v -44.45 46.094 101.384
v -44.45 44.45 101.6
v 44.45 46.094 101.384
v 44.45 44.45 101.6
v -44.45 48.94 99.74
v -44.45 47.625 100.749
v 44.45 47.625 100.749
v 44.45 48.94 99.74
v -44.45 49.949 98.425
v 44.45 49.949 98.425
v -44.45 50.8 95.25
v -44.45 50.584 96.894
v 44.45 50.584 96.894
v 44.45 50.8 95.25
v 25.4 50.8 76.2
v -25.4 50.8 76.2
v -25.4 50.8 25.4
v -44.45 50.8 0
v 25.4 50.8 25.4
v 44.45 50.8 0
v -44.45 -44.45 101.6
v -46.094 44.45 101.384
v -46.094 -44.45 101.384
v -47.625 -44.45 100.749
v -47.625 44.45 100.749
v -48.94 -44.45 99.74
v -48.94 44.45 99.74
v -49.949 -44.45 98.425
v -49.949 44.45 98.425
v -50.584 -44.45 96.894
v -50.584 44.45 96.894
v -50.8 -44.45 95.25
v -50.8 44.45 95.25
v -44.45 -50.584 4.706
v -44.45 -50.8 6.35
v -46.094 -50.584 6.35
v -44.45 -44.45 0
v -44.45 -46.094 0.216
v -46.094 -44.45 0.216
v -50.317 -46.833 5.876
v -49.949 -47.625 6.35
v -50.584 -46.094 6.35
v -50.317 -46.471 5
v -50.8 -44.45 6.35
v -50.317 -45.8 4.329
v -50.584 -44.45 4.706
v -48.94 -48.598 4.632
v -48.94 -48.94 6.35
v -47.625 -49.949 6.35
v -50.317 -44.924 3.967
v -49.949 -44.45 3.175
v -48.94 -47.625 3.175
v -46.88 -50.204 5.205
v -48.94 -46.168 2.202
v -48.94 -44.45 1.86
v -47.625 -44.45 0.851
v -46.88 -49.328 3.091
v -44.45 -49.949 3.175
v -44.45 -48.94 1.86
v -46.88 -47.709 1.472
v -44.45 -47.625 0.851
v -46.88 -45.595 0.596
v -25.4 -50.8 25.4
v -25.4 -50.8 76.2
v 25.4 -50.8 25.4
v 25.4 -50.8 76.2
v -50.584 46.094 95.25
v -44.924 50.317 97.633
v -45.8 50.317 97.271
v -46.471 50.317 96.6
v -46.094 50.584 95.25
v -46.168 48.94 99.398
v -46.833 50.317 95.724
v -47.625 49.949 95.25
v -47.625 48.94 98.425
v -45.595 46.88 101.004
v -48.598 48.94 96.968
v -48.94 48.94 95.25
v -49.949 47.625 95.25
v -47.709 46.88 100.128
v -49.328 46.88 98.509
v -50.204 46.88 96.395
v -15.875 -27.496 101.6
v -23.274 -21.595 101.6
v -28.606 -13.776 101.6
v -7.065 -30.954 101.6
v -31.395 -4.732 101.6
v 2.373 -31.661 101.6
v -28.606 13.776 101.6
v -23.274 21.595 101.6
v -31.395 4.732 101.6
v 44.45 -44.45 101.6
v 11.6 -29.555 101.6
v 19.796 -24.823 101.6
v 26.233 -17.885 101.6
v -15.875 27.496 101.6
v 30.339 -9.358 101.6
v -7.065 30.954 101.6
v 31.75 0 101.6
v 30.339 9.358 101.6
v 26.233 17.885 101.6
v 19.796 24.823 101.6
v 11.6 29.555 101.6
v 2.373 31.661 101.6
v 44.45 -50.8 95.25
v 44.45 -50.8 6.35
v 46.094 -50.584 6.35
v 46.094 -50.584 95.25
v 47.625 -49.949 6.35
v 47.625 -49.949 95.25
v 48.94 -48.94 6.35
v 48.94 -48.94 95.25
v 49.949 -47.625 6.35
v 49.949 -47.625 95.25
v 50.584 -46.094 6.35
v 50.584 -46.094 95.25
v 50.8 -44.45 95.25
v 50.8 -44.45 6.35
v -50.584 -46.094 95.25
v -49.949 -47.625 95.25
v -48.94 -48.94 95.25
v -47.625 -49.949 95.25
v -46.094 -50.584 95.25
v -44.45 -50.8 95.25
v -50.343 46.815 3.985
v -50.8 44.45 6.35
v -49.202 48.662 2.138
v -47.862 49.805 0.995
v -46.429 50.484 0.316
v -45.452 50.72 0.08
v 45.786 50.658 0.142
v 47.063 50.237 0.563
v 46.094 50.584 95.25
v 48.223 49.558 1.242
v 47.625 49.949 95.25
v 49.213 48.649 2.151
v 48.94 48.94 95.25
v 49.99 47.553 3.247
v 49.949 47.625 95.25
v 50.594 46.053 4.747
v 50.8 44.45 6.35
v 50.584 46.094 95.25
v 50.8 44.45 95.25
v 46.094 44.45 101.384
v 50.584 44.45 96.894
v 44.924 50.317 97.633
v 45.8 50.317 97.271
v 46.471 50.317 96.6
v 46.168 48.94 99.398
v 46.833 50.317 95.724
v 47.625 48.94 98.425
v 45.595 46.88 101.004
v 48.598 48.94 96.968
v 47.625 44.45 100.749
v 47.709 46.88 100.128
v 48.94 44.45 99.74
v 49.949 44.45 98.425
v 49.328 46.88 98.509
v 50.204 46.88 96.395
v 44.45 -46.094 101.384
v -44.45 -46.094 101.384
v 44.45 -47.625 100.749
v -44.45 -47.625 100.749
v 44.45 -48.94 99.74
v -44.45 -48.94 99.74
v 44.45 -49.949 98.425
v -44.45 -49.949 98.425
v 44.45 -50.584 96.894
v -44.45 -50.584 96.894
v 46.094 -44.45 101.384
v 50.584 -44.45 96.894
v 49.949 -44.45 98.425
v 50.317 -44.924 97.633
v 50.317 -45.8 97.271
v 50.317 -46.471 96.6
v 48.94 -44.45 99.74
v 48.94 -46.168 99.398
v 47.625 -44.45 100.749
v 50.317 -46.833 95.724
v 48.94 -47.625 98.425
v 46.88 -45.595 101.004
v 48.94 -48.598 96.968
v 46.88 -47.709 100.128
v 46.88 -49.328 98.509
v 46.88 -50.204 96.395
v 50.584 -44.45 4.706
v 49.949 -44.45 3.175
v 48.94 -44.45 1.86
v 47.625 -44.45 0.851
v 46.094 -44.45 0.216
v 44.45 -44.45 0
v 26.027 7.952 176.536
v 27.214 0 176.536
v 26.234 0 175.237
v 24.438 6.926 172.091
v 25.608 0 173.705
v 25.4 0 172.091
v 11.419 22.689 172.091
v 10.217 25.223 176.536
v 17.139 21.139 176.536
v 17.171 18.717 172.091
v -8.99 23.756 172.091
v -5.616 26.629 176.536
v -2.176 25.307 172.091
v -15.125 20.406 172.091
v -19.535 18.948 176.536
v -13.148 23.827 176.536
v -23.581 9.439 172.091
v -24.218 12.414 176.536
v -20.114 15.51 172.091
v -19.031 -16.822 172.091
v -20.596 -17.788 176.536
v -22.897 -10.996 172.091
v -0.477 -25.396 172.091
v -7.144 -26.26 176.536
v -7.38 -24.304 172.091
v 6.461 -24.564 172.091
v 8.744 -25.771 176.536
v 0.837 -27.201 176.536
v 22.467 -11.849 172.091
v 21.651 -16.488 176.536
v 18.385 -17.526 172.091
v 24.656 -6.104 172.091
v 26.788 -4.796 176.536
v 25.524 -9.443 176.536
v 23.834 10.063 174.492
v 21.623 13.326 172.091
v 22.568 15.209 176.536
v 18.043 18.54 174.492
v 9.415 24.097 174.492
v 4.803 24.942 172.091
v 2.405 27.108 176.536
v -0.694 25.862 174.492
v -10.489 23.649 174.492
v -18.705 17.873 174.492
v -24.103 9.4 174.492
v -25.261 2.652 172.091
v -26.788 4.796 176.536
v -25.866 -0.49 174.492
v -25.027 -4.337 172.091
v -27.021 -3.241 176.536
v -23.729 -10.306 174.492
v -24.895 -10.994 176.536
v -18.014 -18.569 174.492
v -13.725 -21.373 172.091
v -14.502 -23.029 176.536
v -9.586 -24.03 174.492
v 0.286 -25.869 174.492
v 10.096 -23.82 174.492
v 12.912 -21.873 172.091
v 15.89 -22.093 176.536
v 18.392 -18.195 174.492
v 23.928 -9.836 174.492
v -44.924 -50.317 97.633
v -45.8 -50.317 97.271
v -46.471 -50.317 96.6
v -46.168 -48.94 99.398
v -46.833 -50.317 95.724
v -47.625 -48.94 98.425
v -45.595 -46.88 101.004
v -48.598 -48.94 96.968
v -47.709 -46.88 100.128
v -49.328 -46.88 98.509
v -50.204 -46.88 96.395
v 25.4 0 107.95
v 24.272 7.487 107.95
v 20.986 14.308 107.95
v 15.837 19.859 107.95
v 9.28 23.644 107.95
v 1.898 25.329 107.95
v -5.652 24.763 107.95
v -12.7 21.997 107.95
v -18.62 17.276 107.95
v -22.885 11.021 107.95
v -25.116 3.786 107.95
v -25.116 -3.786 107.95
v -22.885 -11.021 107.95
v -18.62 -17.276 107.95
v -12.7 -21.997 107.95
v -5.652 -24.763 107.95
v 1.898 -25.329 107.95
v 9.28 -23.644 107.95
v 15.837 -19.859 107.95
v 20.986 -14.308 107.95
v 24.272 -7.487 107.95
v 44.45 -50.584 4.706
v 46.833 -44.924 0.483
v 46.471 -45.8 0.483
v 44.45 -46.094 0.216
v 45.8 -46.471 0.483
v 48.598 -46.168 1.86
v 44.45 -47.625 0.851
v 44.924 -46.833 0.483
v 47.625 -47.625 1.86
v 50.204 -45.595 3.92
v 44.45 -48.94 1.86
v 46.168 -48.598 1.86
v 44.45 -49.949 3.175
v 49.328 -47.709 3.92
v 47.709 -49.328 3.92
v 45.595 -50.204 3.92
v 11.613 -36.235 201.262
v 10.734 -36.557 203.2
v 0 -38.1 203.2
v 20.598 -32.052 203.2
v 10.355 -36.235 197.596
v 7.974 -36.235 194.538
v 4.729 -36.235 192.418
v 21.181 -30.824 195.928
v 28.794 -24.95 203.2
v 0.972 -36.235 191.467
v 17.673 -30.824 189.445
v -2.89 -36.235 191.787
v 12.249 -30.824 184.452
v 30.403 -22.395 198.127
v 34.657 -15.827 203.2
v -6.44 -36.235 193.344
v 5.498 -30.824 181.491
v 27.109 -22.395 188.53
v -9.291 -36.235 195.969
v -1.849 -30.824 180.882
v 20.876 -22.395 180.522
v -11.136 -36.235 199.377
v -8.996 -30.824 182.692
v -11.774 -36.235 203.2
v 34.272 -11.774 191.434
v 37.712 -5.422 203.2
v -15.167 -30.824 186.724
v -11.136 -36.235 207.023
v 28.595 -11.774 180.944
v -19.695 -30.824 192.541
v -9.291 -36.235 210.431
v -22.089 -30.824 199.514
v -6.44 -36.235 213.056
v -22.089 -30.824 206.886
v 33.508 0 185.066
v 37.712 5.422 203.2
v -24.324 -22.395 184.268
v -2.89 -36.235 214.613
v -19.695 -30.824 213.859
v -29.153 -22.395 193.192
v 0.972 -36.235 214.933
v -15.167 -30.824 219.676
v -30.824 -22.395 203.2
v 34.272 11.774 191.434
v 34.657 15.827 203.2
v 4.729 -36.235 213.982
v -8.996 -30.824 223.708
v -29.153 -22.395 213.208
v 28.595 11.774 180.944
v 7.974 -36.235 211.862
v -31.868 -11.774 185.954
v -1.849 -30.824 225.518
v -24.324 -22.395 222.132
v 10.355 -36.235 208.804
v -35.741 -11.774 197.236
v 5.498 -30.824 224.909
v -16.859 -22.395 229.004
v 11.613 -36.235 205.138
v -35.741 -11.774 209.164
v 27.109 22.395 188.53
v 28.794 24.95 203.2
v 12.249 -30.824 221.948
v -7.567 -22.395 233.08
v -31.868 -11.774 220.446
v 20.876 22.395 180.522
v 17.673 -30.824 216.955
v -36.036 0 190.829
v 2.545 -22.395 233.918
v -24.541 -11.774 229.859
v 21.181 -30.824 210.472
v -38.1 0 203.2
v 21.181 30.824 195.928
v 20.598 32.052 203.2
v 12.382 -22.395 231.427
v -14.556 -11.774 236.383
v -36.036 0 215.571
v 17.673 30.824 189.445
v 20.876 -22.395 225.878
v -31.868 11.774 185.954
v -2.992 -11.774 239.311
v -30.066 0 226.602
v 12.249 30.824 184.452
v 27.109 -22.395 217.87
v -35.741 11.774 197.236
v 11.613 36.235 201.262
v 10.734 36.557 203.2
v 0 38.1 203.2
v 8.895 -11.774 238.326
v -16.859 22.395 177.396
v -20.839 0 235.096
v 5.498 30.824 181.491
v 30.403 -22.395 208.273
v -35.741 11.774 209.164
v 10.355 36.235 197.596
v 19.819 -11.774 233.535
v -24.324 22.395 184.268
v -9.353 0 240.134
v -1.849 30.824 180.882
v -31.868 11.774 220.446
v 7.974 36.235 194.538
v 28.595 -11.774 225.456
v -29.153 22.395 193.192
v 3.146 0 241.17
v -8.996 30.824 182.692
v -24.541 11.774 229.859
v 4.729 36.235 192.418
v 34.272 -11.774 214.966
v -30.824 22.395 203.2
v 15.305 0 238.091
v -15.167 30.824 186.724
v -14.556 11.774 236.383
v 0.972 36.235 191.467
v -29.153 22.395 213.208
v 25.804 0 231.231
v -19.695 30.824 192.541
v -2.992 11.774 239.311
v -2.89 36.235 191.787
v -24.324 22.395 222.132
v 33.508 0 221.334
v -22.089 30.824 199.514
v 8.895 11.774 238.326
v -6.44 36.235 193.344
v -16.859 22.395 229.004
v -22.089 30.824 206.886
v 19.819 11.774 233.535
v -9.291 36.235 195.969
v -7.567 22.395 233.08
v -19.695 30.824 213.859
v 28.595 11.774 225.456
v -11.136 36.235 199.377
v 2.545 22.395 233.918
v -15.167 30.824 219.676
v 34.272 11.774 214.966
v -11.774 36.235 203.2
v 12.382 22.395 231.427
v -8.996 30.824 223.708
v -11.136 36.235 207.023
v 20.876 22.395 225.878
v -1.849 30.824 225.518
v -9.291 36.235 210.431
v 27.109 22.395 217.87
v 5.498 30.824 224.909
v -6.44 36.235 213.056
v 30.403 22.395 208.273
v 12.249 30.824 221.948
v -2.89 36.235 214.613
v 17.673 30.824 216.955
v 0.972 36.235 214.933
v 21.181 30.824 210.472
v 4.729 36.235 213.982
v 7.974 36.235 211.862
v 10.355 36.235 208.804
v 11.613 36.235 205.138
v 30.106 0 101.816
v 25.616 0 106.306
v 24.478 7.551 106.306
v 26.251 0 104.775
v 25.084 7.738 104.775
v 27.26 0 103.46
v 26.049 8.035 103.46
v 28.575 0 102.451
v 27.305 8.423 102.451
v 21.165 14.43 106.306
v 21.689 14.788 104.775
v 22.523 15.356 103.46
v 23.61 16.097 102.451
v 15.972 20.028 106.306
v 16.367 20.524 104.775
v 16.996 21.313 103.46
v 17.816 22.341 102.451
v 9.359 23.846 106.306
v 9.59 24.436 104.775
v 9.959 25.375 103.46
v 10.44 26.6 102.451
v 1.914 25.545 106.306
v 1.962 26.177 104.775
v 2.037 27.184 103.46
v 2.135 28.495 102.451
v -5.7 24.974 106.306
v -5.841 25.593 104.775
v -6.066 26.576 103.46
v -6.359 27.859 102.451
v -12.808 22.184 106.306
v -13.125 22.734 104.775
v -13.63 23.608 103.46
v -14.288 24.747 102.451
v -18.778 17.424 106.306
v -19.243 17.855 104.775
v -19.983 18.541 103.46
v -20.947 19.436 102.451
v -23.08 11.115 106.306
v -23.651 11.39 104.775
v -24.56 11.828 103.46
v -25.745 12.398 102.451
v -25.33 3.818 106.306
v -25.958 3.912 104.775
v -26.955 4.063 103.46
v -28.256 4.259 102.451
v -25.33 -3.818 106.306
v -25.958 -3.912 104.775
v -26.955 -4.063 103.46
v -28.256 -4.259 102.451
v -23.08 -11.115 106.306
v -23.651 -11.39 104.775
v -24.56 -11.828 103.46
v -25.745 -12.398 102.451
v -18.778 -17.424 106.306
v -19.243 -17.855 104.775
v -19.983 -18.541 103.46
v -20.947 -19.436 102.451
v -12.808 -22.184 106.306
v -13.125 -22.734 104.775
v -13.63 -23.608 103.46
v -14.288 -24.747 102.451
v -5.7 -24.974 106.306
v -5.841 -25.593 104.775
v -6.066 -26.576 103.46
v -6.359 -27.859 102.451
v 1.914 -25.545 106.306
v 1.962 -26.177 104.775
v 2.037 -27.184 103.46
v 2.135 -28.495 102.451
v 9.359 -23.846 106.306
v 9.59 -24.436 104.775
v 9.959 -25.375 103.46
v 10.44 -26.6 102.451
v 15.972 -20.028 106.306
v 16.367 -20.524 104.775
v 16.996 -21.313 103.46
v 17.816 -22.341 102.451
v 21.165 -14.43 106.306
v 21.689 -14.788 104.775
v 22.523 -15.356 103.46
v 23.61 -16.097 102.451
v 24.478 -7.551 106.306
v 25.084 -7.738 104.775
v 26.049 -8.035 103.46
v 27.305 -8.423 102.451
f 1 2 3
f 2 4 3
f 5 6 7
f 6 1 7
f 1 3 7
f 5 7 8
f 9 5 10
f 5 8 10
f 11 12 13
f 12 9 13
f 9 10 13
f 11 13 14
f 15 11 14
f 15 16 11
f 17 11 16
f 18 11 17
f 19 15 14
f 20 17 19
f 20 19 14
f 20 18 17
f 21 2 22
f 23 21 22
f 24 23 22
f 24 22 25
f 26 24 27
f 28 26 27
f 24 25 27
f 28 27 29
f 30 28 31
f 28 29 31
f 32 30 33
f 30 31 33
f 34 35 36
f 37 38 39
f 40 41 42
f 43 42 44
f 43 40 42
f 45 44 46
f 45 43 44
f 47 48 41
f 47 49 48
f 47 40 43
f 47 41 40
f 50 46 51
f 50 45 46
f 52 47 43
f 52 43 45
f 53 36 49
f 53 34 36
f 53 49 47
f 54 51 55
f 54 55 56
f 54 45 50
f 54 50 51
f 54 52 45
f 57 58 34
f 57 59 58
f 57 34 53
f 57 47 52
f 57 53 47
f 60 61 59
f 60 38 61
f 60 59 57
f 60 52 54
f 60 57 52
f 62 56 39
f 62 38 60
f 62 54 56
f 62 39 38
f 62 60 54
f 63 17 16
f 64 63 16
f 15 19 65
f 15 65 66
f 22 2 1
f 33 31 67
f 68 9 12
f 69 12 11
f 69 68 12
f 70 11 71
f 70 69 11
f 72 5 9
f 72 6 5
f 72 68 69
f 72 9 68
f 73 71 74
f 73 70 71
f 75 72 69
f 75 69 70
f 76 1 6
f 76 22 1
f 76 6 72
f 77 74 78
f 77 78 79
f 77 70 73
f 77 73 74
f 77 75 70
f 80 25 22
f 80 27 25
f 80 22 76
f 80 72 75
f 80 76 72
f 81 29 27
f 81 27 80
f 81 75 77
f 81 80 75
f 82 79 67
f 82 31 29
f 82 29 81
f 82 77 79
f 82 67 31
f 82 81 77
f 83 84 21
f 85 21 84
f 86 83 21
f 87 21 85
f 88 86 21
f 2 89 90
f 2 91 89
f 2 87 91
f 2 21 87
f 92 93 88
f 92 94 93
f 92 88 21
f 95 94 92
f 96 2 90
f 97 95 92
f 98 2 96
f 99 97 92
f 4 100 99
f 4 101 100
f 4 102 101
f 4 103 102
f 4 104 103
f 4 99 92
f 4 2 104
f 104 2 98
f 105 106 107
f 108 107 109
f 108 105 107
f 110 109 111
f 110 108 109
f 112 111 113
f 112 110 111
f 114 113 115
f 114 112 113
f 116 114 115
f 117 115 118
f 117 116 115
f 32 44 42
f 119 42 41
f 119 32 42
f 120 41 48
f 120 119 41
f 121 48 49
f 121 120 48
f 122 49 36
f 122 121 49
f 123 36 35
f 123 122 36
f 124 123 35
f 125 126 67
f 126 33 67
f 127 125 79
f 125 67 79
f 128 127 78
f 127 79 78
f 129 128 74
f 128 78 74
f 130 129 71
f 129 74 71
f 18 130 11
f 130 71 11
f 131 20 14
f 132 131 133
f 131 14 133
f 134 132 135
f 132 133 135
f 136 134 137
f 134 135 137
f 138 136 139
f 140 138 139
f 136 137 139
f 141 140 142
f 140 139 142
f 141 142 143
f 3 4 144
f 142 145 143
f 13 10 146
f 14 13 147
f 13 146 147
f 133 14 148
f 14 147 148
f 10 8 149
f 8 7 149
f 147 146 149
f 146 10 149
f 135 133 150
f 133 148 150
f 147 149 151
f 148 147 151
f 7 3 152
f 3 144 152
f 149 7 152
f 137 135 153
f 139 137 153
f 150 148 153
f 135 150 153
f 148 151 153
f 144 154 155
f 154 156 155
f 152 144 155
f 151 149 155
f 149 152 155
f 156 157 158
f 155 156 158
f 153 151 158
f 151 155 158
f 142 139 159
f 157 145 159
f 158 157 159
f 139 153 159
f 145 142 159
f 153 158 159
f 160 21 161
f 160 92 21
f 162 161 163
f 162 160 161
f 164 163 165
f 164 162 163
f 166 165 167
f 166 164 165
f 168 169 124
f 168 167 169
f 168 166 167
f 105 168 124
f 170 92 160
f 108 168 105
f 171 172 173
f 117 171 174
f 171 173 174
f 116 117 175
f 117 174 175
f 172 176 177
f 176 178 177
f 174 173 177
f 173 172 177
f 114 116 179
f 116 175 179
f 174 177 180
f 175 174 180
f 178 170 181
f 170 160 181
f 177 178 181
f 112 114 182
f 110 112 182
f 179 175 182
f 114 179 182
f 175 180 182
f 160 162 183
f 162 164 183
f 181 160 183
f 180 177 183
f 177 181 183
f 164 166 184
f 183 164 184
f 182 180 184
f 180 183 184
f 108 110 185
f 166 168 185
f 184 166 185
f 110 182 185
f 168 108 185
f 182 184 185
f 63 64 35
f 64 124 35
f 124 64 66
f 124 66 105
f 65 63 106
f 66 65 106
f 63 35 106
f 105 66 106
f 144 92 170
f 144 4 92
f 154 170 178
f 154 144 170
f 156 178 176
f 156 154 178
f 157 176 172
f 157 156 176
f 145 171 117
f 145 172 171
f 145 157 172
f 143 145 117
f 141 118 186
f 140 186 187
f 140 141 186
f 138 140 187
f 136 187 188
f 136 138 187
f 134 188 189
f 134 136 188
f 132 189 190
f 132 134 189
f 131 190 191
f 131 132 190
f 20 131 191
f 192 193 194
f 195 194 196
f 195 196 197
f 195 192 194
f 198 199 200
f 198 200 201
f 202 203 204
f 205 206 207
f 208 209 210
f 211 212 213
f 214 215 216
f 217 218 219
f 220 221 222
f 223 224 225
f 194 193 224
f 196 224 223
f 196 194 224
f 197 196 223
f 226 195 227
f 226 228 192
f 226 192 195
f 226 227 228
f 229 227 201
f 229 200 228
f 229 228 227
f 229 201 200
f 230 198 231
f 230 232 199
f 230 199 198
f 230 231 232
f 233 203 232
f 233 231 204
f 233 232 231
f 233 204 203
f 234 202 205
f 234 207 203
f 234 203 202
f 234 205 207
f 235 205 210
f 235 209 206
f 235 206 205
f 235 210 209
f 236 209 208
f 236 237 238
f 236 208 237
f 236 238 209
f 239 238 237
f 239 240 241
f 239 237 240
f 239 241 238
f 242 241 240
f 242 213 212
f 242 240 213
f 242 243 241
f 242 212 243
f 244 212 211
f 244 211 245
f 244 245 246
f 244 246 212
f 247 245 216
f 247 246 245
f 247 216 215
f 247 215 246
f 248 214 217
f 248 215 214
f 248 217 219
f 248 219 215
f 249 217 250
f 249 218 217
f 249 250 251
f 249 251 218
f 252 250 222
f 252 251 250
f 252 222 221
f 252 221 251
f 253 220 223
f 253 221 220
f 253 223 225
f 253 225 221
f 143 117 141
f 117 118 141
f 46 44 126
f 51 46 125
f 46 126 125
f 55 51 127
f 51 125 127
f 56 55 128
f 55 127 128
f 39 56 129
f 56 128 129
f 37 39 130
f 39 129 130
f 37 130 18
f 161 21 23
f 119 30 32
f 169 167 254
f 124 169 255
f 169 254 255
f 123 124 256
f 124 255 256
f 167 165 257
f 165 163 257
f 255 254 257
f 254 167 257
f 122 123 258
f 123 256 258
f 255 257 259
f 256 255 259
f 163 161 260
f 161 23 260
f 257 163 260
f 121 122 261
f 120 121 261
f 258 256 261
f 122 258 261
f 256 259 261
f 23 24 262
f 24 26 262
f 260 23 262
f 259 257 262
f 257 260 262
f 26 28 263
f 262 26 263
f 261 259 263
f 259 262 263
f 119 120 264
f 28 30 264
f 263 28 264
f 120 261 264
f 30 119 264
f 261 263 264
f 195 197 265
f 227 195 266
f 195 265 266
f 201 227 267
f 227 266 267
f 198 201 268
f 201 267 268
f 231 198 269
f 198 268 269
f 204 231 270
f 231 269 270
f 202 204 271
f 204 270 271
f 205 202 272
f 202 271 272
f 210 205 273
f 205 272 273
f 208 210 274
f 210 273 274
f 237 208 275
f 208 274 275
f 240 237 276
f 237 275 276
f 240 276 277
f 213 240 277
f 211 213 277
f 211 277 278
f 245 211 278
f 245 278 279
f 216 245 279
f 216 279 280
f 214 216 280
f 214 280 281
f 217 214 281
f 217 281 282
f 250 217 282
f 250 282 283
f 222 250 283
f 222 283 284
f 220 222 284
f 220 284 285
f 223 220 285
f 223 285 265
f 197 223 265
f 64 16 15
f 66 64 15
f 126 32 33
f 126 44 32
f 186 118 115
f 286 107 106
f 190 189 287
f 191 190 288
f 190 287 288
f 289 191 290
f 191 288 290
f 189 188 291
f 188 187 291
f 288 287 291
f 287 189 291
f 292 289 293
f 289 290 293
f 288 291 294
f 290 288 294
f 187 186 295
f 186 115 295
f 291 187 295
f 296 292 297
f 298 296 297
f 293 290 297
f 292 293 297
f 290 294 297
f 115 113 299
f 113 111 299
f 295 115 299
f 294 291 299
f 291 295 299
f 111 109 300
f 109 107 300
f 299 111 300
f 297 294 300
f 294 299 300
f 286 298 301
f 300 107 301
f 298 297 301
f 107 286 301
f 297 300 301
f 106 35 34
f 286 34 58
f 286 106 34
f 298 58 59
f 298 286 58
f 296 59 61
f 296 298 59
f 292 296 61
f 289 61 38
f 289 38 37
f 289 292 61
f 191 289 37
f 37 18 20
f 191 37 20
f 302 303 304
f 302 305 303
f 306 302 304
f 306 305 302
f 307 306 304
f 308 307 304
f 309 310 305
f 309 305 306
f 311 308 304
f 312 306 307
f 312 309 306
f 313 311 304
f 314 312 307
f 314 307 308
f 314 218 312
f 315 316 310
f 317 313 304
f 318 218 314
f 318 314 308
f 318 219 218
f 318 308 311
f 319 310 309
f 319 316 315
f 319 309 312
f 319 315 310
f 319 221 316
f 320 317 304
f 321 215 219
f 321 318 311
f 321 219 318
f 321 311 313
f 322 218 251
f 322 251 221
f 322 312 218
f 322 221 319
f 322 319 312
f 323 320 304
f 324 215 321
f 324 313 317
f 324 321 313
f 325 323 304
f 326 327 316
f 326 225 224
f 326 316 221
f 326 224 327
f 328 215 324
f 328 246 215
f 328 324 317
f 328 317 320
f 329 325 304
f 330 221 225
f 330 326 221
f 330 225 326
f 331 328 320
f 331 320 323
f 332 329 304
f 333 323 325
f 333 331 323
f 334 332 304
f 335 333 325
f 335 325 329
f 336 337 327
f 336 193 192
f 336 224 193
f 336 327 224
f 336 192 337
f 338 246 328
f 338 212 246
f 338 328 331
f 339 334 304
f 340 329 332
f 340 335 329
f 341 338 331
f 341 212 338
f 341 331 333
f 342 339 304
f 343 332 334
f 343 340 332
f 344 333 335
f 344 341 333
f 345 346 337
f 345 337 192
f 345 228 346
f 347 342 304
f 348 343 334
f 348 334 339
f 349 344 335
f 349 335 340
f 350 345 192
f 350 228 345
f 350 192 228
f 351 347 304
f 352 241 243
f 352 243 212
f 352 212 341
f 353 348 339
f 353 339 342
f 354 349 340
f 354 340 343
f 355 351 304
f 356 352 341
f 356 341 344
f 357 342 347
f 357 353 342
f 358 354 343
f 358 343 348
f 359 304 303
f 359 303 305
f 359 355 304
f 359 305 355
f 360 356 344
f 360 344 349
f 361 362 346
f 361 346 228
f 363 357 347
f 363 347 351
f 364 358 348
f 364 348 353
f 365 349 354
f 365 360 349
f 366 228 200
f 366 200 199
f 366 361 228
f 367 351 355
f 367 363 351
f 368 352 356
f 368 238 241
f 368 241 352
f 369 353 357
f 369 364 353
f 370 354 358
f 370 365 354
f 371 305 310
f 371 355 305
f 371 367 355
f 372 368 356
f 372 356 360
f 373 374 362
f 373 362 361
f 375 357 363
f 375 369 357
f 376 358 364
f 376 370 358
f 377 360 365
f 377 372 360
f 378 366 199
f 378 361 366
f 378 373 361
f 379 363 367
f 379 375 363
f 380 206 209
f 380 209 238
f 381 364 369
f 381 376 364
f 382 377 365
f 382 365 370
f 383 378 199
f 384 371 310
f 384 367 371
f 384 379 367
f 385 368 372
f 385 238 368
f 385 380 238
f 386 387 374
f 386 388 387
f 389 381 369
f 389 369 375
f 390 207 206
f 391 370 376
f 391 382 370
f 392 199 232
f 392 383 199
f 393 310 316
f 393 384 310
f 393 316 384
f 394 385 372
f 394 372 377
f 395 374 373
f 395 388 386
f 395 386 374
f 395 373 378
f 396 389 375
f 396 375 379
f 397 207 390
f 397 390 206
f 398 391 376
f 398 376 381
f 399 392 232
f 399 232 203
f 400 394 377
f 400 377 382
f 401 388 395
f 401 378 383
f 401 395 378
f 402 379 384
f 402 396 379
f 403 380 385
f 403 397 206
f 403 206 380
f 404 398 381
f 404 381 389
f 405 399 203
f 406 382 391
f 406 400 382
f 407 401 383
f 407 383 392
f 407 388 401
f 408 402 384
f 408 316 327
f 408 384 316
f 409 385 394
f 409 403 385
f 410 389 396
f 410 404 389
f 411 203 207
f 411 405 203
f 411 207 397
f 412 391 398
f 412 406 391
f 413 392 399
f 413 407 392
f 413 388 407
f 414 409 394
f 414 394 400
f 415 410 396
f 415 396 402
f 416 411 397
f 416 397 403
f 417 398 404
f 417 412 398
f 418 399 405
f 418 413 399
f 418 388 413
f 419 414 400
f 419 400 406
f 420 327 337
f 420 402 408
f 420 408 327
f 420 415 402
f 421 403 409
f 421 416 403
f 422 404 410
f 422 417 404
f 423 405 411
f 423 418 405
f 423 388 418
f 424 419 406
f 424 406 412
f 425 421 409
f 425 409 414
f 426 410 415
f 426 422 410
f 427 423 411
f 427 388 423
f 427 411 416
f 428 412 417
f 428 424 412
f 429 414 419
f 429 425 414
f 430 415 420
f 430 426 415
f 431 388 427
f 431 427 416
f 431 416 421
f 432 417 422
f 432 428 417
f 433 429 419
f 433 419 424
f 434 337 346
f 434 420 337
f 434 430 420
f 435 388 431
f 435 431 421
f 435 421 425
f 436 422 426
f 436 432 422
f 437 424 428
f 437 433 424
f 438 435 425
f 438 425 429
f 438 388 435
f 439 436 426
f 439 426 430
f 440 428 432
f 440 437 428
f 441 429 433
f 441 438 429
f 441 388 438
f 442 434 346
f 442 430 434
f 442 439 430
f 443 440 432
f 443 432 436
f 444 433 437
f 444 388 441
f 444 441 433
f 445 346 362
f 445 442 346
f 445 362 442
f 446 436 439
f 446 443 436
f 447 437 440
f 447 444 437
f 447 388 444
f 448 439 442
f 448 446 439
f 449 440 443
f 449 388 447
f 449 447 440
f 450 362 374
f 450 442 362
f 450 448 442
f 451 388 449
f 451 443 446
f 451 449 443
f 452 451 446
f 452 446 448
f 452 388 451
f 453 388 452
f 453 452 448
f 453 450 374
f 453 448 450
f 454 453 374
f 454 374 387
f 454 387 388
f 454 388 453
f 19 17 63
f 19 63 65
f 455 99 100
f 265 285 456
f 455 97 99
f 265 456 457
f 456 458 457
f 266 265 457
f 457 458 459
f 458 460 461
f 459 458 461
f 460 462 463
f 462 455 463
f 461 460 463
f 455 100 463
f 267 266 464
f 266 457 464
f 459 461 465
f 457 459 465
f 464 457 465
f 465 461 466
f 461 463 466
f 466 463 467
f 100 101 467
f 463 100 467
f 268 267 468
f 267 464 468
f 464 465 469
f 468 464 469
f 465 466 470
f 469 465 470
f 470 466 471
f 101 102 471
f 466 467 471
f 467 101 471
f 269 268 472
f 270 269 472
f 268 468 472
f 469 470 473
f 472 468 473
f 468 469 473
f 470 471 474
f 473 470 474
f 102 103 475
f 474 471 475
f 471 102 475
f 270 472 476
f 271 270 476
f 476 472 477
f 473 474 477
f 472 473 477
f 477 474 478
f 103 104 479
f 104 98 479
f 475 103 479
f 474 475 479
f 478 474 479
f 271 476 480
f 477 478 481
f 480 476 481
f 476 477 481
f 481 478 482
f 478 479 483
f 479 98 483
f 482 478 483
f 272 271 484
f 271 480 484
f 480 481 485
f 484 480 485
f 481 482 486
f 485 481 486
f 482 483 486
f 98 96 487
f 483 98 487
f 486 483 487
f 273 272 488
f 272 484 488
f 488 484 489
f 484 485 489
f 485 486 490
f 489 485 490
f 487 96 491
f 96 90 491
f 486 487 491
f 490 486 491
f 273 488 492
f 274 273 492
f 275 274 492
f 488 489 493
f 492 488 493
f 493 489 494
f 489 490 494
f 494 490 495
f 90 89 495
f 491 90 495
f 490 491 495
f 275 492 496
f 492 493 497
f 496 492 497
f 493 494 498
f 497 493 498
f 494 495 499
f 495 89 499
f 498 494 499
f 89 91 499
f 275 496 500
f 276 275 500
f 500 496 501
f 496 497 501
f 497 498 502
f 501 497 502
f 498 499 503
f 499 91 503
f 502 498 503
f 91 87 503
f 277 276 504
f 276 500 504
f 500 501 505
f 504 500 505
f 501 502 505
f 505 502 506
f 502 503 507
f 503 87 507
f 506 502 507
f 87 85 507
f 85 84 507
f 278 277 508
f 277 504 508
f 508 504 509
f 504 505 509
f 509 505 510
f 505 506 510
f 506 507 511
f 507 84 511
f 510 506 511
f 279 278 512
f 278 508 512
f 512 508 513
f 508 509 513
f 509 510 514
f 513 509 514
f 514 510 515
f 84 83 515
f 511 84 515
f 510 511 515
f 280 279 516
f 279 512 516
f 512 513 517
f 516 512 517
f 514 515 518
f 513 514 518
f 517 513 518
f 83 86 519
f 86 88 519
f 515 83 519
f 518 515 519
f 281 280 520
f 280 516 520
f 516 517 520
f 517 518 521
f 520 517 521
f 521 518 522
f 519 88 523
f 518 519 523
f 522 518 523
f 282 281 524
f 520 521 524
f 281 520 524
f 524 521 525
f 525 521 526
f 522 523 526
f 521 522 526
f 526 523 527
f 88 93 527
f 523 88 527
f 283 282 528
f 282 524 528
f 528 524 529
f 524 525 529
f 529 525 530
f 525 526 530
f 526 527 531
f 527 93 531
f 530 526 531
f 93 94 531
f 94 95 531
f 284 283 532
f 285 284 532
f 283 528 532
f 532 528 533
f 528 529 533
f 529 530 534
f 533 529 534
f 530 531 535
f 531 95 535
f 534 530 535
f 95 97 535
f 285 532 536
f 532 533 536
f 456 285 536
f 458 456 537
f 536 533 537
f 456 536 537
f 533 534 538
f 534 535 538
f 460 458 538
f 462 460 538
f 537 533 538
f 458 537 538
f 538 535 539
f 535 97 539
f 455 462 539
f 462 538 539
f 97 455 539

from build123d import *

# Parameters (mm, degrees)
F0_W     = 101.6
F0_H     = 101.6
F1_DEPTH = 101.6
F2_R     = 25.4
F3_DEPTH = 101.6
F6_W     = 50.8
F6_H     = 50.8
F7_DEPTH = 101.6
F8_R     = 6.35


with BuildPart() as f1:
    # F0 (on Top) → F1 (new body)
    with BuildSketch(Plane.XY):
        Rectangle(F0_W, F0_H)
    extrude(amount=F1_DEPTH)

    # F2 (on face) → F3 (join)
    with BuildSketch(Plane.XY.offset(101.6)):
        Circle(F2_R)
    extrude(amount=F3_DEPTH)

    # F4 (on face) → F5 (revolve)
    with BuildSketch(Plane.XY.offset(203.2)):
        with BuildLine():
            Line((0, -25.4), (0, -38.1))
            ThreePointArc((0, -38.1), (38.1, 0), (0, 38.1))
            Line((0, 38.1), (0, 25.4))
            ThreePointArc((0, 25.4), (17.960512, 17.960512), (25.4, 0))
            ThreePointArc((25.4, 0), (17.960512, -17.960512), (0, -25.4))
        make_face()
        with BuildLine():
            ThreePointArc((0, 25.4), (-25.4, 0), (0, -25.4))
            Line((0, -25.4), (0, 0))
            Line((0, 0), (0, 25.4))
        make_face()
    revolve(axis=Axis((0, -19.05, 203.2), (0, 1, 0)))

    # F6 (on face) → F7 (cut)
    with BuildSketch(Plane.XZ.offset(50.8)):
        with Locations((0, 50.8)):
            Rectangle(F6_W, F6_H)
    extrude(amount=-F7_DEPTH, mode=Mode.SUBTRACT)

    # F8
    f8_edges = [f1.edges().sort_by_distance(p)[0] for p in [
        (-50.8, 0, 101.6),
        (0, -50.8, 101.6),
        (50.8, 0, 101.6),
        (0, 50.8, 101.6),
        (50.8, 50.8, 50.8),
        (50.8, -50.8, 50.8),
        (50.8, 0, 0),
        (0, -50.8, 0),
        (-50.8, -50.8, 50.8),
        (-50.8, 50.8, 50.8),
        (-50.8, 0, 0),
        (-25.4, 0, 101.6),
        (25.4, 0, 138.200968),
        (-25.4, 0, 174.801937),
    ]]
    fillet(f8_edges, radius=F8_R)


solid = f1.part
